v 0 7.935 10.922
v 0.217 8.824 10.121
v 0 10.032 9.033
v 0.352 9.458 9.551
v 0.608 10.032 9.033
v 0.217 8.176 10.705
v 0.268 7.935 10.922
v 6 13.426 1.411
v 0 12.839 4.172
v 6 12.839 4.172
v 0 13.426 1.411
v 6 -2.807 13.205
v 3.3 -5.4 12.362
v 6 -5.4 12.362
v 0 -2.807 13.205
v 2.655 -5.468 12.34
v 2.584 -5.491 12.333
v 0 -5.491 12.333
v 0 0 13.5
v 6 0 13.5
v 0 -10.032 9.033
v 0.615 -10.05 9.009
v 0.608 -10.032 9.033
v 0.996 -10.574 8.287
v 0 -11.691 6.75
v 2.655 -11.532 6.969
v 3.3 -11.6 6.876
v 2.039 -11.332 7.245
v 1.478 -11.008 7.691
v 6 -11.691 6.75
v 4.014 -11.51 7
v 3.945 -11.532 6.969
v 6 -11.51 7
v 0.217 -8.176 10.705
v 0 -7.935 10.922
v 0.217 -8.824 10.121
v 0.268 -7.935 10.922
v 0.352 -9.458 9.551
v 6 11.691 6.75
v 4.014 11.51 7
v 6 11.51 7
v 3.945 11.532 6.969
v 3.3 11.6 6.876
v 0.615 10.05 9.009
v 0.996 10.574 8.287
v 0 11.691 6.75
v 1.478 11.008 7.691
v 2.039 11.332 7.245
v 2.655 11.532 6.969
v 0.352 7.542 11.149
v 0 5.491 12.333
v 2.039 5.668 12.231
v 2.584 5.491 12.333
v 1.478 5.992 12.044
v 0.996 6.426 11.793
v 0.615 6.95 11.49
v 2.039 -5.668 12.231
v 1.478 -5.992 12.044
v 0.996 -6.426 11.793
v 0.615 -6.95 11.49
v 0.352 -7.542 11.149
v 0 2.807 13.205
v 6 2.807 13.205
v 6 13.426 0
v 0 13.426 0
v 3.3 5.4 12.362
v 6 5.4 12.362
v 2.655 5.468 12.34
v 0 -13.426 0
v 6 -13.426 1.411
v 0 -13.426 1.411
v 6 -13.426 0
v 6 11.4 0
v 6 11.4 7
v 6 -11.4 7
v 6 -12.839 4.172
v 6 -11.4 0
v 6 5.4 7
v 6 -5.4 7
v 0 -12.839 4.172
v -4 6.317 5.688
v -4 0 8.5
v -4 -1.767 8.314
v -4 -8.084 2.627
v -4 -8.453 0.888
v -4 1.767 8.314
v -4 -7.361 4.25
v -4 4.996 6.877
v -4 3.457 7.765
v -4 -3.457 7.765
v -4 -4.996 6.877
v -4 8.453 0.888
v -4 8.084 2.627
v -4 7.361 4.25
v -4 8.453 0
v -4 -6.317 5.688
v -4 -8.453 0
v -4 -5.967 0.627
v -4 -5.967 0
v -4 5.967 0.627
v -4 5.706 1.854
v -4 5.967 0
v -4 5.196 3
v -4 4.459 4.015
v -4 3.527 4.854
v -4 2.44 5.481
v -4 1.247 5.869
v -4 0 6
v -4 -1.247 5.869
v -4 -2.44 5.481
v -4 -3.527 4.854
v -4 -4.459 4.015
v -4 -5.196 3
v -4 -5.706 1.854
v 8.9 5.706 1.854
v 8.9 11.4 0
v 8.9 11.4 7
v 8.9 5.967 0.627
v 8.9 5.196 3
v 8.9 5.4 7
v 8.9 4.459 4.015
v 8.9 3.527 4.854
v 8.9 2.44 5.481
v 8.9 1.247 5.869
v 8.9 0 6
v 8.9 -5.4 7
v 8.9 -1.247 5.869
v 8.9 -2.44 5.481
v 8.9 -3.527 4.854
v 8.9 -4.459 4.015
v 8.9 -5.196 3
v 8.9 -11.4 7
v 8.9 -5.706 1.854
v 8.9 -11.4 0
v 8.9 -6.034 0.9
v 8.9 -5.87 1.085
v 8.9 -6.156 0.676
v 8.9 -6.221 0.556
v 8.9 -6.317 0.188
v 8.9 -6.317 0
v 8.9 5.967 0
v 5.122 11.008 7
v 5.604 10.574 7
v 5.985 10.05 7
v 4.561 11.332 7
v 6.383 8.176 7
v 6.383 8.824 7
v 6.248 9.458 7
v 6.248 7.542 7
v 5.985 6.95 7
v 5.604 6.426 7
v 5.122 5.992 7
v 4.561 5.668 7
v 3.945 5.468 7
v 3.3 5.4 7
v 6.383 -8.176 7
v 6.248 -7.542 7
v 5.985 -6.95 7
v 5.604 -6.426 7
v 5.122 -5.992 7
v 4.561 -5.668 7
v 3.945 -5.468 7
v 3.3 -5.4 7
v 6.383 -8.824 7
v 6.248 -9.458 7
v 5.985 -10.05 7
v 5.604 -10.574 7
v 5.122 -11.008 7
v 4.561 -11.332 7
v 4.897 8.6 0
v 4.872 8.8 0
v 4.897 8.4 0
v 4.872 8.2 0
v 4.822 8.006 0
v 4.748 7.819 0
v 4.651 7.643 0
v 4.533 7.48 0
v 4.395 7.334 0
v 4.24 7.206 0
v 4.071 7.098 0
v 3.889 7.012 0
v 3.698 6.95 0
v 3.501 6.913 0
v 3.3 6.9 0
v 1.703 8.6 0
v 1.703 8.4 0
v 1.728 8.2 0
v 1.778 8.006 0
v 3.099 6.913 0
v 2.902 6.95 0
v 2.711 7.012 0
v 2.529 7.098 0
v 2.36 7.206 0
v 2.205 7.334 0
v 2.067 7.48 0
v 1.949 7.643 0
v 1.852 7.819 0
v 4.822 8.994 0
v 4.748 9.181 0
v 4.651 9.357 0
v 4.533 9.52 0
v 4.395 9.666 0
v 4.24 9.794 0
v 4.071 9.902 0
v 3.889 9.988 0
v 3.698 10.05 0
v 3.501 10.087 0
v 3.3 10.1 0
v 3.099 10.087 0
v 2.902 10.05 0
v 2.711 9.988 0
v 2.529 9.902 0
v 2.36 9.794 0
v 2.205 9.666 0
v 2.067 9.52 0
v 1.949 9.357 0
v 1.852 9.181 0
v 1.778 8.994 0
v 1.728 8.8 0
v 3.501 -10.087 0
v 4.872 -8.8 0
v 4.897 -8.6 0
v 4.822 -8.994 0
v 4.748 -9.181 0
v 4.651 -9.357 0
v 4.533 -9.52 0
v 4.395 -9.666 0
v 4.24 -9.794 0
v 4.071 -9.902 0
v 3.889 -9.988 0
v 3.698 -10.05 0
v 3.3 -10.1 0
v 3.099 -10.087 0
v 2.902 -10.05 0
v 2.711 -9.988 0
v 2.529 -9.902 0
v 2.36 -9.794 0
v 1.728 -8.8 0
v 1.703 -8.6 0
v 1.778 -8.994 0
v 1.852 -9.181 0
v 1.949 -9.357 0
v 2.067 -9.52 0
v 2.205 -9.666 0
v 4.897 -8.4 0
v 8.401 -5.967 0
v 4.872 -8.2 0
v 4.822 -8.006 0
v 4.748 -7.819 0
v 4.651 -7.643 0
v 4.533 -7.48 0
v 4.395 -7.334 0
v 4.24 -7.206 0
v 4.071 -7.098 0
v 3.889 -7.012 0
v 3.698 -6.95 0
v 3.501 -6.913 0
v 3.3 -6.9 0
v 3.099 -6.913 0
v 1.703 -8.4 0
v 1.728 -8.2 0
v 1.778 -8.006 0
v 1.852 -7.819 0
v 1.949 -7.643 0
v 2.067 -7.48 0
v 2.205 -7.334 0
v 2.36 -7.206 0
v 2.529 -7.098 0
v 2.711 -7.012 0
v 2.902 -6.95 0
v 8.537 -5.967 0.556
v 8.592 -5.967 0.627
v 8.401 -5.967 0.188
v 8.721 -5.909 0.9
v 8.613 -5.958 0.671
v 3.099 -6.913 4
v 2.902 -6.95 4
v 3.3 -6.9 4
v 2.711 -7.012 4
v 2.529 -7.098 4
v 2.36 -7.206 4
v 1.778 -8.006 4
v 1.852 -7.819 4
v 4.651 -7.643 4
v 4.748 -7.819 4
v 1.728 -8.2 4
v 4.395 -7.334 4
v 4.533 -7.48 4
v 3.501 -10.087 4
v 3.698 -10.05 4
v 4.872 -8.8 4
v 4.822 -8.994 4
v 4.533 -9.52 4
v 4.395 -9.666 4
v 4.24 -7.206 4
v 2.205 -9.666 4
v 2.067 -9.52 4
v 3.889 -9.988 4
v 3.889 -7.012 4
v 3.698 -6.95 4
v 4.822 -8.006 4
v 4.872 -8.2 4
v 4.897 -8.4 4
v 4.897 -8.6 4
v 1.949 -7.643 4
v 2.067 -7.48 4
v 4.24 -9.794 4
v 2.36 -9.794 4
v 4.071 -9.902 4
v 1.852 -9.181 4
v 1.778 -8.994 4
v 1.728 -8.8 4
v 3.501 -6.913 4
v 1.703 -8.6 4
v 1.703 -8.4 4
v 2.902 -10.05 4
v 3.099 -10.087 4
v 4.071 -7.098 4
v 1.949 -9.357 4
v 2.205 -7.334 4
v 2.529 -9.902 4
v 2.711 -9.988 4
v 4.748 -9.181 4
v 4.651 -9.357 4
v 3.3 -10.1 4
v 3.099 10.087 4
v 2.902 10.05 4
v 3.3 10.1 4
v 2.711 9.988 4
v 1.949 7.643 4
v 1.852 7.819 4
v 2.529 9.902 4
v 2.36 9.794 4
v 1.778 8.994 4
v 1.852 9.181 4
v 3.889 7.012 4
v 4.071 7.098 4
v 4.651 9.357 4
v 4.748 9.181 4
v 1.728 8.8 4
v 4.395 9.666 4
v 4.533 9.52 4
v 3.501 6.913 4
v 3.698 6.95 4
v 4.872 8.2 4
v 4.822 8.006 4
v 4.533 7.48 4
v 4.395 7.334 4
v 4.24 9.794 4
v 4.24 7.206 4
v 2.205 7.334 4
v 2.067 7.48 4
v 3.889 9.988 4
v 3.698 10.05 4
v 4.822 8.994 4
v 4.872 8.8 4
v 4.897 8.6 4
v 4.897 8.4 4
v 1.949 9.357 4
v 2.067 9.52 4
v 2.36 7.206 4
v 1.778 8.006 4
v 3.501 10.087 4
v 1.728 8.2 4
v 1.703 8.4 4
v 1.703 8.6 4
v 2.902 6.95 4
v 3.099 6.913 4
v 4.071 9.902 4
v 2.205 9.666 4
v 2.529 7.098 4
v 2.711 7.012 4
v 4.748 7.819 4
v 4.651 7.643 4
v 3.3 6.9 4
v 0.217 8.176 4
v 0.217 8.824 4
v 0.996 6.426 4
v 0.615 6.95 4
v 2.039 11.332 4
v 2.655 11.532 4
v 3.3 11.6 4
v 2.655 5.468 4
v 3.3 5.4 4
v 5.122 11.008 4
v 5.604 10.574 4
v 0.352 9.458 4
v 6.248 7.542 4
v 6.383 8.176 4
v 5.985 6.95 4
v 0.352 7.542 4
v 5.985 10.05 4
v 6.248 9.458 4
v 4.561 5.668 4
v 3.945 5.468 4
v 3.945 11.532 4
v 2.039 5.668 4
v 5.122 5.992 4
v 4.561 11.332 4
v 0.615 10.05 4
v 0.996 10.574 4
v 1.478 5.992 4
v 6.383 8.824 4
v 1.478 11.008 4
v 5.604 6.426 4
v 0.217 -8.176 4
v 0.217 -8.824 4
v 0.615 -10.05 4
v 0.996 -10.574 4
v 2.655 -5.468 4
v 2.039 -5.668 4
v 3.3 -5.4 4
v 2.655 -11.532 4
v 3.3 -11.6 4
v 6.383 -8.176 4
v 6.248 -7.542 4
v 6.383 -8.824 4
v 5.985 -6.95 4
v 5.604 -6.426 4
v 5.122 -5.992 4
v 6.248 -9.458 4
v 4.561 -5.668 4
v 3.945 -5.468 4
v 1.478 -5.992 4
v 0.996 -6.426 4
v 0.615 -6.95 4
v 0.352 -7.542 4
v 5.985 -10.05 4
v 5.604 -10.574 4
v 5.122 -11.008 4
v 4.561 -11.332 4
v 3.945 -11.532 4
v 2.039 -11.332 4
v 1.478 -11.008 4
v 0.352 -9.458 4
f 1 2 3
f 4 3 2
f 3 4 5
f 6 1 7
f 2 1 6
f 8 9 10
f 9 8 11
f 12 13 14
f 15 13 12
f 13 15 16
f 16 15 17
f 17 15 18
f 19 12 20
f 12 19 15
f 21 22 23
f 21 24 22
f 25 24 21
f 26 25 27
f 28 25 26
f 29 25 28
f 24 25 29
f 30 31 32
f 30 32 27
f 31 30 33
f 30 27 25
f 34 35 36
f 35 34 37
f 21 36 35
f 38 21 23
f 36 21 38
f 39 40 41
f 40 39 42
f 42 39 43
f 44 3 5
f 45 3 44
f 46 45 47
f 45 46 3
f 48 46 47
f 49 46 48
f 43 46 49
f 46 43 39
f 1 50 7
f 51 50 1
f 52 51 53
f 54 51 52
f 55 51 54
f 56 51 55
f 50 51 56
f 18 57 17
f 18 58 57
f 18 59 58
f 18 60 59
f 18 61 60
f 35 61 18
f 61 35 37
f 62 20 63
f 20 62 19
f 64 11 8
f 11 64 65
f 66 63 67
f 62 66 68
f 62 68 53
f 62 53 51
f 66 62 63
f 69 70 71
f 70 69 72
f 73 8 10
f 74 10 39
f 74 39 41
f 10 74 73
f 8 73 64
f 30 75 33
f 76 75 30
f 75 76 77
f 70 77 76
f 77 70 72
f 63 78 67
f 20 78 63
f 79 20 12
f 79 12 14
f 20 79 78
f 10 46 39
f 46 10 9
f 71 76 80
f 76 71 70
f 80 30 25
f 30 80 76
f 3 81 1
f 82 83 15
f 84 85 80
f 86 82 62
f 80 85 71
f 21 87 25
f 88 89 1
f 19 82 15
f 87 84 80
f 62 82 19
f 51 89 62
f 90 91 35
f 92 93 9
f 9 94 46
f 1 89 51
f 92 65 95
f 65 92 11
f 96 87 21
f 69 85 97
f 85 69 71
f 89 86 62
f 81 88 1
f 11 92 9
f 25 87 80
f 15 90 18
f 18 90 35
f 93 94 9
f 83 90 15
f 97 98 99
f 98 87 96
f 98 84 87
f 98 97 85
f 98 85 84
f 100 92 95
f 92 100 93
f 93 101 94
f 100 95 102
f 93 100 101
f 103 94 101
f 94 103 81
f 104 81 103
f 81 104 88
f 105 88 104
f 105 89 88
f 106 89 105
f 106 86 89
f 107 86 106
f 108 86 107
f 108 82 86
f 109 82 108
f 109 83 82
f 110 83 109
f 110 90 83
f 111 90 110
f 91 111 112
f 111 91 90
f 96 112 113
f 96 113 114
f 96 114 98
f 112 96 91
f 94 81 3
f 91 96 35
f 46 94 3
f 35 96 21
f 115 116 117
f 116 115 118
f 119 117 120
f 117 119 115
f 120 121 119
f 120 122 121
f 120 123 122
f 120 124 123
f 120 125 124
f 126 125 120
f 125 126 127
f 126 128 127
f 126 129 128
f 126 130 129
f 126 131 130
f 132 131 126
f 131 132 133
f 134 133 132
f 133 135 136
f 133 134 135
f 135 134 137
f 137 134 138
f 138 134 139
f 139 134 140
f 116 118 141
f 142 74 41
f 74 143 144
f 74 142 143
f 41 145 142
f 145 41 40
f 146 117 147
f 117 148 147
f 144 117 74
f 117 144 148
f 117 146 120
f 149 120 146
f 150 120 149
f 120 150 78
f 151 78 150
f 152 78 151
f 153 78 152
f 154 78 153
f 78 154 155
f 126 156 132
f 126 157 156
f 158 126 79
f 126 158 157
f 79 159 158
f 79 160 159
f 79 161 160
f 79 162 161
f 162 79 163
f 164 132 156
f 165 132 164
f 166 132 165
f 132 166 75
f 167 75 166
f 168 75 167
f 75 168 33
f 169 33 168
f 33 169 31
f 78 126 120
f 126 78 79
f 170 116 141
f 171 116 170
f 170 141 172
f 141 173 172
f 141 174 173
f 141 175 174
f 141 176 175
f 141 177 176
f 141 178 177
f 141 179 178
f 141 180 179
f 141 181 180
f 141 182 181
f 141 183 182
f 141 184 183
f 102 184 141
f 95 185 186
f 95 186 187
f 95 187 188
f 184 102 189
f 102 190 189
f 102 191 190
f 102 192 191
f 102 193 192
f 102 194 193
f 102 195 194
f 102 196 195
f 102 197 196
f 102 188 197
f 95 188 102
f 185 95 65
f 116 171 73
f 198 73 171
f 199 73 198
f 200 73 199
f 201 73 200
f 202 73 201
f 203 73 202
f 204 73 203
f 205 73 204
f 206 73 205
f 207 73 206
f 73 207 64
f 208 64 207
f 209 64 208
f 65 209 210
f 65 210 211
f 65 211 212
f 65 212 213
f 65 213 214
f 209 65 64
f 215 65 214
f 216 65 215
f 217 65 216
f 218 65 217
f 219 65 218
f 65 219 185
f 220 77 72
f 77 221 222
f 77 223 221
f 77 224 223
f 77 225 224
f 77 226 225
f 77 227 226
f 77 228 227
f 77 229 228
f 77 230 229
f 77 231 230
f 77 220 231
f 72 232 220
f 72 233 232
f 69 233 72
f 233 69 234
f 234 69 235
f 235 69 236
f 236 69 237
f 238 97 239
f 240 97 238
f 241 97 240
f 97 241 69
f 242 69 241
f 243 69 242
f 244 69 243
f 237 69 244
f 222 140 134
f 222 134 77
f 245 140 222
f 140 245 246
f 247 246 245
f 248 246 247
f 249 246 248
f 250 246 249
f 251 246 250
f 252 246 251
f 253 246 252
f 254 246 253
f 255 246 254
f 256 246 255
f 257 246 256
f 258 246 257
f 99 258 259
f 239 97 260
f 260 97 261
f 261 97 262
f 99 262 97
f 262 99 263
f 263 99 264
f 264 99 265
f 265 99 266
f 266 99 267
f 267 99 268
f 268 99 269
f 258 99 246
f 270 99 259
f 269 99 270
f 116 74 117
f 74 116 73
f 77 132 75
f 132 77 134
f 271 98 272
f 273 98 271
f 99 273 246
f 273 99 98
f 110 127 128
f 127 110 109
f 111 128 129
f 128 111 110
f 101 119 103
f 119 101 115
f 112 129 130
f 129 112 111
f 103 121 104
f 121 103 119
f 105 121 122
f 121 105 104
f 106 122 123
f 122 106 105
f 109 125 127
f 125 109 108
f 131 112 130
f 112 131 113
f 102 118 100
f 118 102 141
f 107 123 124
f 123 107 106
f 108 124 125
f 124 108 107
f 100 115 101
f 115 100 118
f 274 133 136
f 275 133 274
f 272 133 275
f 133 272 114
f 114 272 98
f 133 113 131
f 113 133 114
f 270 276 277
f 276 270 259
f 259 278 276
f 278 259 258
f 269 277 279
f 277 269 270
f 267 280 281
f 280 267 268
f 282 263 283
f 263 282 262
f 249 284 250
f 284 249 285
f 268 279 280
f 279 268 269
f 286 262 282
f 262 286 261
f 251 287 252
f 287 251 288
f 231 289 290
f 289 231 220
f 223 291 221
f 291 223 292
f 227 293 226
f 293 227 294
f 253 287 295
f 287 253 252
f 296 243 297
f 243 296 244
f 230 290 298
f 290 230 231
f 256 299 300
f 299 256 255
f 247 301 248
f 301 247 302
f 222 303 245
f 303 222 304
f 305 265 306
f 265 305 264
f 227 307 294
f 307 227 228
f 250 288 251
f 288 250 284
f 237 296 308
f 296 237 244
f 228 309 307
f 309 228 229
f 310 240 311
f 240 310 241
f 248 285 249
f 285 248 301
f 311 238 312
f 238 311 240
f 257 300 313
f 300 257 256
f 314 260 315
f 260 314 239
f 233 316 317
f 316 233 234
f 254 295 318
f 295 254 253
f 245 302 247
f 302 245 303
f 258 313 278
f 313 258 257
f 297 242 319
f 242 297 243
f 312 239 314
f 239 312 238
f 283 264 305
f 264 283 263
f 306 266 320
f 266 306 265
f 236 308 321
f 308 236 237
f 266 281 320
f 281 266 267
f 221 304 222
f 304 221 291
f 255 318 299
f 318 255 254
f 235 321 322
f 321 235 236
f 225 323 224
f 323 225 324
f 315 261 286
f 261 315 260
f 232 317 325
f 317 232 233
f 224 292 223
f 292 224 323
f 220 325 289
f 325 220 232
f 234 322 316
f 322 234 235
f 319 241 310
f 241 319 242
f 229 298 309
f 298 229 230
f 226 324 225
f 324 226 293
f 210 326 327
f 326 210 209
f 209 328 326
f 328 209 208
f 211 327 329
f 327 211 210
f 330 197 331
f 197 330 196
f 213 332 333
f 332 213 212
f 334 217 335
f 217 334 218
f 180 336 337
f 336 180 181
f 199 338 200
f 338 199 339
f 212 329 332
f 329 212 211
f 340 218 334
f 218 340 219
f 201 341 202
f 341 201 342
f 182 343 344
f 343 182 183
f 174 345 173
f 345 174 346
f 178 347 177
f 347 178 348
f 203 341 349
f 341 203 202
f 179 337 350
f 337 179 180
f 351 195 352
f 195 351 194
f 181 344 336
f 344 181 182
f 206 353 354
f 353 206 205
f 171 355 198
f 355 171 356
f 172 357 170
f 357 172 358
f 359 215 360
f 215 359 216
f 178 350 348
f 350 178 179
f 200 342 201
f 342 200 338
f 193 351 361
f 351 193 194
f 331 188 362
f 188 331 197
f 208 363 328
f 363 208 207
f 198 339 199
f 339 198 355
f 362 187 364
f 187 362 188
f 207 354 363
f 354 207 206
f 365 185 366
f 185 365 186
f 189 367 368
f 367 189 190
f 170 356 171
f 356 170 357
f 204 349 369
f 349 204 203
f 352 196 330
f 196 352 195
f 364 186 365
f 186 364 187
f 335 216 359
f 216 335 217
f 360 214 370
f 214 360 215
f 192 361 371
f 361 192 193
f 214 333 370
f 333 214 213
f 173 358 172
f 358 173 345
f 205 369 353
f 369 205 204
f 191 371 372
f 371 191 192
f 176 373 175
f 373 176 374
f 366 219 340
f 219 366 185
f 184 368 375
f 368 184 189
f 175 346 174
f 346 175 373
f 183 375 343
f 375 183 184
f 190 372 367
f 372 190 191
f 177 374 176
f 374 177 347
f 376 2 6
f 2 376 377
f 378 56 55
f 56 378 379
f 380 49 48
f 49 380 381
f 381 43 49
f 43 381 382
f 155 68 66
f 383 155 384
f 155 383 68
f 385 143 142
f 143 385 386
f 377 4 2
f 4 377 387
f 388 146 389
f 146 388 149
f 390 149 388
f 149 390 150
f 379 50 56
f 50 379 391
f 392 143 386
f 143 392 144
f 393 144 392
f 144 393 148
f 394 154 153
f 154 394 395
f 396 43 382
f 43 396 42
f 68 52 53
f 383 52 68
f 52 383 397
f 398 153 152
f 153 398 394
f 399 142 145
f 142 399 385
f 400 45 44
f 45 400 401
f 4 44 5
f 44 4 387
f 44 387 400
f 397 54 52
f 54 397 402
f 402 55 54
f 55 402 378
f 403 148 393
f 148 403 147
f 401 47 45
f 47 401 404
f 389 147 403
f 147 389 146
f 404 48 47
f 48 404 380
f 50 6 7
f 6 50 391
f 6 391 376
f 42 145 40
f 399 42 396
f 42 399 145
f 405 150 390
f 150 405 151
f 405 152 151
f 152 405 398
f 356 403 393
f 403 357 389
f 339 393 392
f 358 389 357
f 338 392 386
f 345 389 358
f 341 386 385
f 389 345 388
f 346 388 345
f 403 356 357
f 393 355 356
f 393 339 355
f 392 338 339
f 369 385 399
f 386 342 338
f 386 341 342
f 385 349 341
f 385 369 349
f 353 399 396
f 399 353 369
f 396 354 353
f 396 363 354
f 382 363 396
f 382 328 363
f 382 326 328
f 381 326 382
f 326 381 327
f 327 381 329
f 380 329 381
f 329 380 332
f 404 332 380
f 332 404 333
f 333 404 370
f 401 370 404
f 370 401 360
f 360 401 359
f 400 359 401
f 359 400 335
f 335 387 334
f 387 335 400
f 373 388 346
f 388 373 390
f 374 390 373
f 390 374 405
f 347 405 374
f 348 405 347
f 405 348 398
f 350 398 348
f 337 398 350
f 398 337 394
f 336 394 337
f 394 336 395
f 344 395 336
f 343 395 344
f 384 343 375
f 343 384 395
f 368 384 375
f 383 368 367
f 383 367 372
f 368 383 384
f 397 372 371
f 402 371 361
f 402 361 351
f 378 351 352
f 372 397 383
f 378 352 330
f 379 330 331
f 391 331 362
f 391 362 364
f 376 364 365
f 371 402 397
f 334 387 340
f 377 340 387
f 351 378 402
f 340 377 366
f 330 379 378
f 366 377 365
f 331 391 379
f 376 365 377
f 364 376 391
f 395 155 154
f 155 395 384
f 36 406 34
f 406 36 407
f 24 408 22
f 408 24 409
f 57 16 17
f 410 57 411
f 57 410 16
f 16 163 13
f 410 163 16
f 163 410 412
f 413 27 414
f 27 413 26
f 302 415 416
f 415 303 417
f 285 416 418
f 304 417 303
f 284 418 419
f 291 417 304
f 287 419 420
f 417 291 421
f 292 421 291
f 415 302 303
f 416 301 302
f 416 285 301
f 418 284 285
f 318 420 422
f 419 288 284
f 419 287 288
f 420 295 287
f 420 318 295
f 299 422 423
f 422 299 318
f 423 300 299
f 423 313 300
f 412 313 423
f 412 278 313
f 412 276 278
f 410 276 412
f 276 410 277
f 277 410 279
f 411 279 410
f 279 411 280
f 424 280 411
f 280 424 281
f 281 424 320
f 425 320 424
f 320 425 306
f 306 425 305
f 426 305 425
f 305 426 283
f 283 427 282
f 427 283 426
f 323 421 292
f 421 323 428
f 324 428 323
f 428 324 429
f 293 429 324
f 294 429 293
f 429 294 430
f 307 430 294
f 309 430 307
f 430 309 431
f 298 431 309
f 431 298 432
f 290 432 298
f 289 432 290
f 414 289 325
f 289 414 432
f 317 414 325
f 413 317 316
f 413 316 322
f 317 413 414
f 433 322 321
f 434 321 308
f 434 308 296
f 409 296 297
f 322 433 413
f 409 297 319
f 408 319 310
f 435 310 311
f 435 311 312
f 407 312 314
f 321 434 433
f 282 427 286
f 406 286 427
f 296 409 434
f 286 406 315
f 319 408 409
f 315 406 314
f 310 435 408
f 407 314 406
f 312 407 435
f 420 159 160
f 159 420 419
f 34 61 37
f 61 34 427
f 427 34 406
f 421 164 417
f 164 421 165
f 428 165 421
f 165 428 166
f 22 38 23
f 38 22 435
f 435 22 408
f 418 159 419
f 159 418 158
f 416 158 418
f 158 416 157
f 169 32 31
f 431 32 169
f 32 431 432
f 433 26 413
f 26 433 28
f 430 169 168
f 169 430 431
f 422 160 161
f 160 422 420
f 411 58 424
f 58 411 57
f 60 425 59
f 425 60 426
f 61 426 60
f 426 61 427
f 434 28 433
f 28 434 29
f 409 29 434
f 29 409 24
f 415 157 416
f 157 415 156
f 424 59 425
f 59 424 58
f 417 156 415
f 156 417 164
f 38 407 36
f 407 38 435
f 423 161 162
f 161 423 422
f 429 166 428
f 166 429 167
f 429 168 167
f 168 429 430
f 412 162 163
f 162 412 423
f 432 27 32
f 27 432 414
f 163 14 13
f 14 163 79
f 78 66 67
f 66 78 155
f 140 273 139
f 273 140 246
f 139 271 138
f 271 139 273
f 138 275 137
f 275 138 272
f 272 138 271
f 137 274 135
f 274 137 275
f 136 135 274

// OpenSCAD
// PRUSA iteration4
// Extruder cable clip
// GNU GPL v3
// Josef Průša <iam@josefprusa.cz> and contributors
// http://www.reprap.org/wiki/Prusa_Mendel
// http://prusamendel.org

module extruder_cable_clip() {

  difference() {
    difference() {
      union() {
        // body shape
        translate([-6, 28, 28]) rotate([0, 90, 0]) cylinder(h=6, r=13.5, $fn=30);
        translate([-10, 28, 28]) rotate([0, 90, 0]) cylinder(h=4, r1=8.5, r2=13.5, $fn=30);
        translate([0, 16.6, 28]) cube([2.9, 22.8, 7]);
      }

      // bottom cut and shape
      translate([-15, 7, 13]) cube([30, 40, 15]);
      translate([-20, 28, 28]) rotate([0, 90, 0]) cylinder(h=40, r=6, $fn=30);

      // screws
      translate([-2.7, 19.5, 25]) rotate([0, 0, 90]) cylinder(h=10, r=1.6, $fn=50);
      translate([-2.7, 36.5, 25]) rotate([0, 0, 90]) cylinder(h=10, r=1.6, $fn=50);
      translate([-2.7, 36.5, 32]) rotate([0, 0, 90]) cylinder(h=13, r=3.1, $fn=30);
      translate([-2.7, 19.5, 32]) rotate([0, 0, 90]) cylinder(h=13, r=3.1, $fn=30);

      // screw heads opening
      translate([-2.7, 16.4, 35]) cube([10, 6.2, 15]);
      translate([-2.7, 33.4, 35]) cube([10, 6.2, 15]);
    }

    difference() {
      // cable grip
      translate([-8, 28, 28]) rotate([0, 90, 0]) cylinder(h=10, r=6, $fn=30);
      translate([-20, 28, 28]) rotate([0, 90, 0]) cylinder(h=40, r=5.5, $fn=30);
      translate([-15, 7, 13]) cube([30, 40, 15]);
      translate([-6, 7, 13]) cube([2, 40, 25]);
      translate([-2, 7, 13]) cube([2, 40, 25]);
    }

    //nylon hole

    translate([-3, 28, 28]) rotate([35, 90, 0]) cylinder(h=24, r=1.8, $fn=30);
  }
}

//translate([0,0,0]) extruder_cable_clip();

translate([6, -28, -28]) extruder_cable_clip();
